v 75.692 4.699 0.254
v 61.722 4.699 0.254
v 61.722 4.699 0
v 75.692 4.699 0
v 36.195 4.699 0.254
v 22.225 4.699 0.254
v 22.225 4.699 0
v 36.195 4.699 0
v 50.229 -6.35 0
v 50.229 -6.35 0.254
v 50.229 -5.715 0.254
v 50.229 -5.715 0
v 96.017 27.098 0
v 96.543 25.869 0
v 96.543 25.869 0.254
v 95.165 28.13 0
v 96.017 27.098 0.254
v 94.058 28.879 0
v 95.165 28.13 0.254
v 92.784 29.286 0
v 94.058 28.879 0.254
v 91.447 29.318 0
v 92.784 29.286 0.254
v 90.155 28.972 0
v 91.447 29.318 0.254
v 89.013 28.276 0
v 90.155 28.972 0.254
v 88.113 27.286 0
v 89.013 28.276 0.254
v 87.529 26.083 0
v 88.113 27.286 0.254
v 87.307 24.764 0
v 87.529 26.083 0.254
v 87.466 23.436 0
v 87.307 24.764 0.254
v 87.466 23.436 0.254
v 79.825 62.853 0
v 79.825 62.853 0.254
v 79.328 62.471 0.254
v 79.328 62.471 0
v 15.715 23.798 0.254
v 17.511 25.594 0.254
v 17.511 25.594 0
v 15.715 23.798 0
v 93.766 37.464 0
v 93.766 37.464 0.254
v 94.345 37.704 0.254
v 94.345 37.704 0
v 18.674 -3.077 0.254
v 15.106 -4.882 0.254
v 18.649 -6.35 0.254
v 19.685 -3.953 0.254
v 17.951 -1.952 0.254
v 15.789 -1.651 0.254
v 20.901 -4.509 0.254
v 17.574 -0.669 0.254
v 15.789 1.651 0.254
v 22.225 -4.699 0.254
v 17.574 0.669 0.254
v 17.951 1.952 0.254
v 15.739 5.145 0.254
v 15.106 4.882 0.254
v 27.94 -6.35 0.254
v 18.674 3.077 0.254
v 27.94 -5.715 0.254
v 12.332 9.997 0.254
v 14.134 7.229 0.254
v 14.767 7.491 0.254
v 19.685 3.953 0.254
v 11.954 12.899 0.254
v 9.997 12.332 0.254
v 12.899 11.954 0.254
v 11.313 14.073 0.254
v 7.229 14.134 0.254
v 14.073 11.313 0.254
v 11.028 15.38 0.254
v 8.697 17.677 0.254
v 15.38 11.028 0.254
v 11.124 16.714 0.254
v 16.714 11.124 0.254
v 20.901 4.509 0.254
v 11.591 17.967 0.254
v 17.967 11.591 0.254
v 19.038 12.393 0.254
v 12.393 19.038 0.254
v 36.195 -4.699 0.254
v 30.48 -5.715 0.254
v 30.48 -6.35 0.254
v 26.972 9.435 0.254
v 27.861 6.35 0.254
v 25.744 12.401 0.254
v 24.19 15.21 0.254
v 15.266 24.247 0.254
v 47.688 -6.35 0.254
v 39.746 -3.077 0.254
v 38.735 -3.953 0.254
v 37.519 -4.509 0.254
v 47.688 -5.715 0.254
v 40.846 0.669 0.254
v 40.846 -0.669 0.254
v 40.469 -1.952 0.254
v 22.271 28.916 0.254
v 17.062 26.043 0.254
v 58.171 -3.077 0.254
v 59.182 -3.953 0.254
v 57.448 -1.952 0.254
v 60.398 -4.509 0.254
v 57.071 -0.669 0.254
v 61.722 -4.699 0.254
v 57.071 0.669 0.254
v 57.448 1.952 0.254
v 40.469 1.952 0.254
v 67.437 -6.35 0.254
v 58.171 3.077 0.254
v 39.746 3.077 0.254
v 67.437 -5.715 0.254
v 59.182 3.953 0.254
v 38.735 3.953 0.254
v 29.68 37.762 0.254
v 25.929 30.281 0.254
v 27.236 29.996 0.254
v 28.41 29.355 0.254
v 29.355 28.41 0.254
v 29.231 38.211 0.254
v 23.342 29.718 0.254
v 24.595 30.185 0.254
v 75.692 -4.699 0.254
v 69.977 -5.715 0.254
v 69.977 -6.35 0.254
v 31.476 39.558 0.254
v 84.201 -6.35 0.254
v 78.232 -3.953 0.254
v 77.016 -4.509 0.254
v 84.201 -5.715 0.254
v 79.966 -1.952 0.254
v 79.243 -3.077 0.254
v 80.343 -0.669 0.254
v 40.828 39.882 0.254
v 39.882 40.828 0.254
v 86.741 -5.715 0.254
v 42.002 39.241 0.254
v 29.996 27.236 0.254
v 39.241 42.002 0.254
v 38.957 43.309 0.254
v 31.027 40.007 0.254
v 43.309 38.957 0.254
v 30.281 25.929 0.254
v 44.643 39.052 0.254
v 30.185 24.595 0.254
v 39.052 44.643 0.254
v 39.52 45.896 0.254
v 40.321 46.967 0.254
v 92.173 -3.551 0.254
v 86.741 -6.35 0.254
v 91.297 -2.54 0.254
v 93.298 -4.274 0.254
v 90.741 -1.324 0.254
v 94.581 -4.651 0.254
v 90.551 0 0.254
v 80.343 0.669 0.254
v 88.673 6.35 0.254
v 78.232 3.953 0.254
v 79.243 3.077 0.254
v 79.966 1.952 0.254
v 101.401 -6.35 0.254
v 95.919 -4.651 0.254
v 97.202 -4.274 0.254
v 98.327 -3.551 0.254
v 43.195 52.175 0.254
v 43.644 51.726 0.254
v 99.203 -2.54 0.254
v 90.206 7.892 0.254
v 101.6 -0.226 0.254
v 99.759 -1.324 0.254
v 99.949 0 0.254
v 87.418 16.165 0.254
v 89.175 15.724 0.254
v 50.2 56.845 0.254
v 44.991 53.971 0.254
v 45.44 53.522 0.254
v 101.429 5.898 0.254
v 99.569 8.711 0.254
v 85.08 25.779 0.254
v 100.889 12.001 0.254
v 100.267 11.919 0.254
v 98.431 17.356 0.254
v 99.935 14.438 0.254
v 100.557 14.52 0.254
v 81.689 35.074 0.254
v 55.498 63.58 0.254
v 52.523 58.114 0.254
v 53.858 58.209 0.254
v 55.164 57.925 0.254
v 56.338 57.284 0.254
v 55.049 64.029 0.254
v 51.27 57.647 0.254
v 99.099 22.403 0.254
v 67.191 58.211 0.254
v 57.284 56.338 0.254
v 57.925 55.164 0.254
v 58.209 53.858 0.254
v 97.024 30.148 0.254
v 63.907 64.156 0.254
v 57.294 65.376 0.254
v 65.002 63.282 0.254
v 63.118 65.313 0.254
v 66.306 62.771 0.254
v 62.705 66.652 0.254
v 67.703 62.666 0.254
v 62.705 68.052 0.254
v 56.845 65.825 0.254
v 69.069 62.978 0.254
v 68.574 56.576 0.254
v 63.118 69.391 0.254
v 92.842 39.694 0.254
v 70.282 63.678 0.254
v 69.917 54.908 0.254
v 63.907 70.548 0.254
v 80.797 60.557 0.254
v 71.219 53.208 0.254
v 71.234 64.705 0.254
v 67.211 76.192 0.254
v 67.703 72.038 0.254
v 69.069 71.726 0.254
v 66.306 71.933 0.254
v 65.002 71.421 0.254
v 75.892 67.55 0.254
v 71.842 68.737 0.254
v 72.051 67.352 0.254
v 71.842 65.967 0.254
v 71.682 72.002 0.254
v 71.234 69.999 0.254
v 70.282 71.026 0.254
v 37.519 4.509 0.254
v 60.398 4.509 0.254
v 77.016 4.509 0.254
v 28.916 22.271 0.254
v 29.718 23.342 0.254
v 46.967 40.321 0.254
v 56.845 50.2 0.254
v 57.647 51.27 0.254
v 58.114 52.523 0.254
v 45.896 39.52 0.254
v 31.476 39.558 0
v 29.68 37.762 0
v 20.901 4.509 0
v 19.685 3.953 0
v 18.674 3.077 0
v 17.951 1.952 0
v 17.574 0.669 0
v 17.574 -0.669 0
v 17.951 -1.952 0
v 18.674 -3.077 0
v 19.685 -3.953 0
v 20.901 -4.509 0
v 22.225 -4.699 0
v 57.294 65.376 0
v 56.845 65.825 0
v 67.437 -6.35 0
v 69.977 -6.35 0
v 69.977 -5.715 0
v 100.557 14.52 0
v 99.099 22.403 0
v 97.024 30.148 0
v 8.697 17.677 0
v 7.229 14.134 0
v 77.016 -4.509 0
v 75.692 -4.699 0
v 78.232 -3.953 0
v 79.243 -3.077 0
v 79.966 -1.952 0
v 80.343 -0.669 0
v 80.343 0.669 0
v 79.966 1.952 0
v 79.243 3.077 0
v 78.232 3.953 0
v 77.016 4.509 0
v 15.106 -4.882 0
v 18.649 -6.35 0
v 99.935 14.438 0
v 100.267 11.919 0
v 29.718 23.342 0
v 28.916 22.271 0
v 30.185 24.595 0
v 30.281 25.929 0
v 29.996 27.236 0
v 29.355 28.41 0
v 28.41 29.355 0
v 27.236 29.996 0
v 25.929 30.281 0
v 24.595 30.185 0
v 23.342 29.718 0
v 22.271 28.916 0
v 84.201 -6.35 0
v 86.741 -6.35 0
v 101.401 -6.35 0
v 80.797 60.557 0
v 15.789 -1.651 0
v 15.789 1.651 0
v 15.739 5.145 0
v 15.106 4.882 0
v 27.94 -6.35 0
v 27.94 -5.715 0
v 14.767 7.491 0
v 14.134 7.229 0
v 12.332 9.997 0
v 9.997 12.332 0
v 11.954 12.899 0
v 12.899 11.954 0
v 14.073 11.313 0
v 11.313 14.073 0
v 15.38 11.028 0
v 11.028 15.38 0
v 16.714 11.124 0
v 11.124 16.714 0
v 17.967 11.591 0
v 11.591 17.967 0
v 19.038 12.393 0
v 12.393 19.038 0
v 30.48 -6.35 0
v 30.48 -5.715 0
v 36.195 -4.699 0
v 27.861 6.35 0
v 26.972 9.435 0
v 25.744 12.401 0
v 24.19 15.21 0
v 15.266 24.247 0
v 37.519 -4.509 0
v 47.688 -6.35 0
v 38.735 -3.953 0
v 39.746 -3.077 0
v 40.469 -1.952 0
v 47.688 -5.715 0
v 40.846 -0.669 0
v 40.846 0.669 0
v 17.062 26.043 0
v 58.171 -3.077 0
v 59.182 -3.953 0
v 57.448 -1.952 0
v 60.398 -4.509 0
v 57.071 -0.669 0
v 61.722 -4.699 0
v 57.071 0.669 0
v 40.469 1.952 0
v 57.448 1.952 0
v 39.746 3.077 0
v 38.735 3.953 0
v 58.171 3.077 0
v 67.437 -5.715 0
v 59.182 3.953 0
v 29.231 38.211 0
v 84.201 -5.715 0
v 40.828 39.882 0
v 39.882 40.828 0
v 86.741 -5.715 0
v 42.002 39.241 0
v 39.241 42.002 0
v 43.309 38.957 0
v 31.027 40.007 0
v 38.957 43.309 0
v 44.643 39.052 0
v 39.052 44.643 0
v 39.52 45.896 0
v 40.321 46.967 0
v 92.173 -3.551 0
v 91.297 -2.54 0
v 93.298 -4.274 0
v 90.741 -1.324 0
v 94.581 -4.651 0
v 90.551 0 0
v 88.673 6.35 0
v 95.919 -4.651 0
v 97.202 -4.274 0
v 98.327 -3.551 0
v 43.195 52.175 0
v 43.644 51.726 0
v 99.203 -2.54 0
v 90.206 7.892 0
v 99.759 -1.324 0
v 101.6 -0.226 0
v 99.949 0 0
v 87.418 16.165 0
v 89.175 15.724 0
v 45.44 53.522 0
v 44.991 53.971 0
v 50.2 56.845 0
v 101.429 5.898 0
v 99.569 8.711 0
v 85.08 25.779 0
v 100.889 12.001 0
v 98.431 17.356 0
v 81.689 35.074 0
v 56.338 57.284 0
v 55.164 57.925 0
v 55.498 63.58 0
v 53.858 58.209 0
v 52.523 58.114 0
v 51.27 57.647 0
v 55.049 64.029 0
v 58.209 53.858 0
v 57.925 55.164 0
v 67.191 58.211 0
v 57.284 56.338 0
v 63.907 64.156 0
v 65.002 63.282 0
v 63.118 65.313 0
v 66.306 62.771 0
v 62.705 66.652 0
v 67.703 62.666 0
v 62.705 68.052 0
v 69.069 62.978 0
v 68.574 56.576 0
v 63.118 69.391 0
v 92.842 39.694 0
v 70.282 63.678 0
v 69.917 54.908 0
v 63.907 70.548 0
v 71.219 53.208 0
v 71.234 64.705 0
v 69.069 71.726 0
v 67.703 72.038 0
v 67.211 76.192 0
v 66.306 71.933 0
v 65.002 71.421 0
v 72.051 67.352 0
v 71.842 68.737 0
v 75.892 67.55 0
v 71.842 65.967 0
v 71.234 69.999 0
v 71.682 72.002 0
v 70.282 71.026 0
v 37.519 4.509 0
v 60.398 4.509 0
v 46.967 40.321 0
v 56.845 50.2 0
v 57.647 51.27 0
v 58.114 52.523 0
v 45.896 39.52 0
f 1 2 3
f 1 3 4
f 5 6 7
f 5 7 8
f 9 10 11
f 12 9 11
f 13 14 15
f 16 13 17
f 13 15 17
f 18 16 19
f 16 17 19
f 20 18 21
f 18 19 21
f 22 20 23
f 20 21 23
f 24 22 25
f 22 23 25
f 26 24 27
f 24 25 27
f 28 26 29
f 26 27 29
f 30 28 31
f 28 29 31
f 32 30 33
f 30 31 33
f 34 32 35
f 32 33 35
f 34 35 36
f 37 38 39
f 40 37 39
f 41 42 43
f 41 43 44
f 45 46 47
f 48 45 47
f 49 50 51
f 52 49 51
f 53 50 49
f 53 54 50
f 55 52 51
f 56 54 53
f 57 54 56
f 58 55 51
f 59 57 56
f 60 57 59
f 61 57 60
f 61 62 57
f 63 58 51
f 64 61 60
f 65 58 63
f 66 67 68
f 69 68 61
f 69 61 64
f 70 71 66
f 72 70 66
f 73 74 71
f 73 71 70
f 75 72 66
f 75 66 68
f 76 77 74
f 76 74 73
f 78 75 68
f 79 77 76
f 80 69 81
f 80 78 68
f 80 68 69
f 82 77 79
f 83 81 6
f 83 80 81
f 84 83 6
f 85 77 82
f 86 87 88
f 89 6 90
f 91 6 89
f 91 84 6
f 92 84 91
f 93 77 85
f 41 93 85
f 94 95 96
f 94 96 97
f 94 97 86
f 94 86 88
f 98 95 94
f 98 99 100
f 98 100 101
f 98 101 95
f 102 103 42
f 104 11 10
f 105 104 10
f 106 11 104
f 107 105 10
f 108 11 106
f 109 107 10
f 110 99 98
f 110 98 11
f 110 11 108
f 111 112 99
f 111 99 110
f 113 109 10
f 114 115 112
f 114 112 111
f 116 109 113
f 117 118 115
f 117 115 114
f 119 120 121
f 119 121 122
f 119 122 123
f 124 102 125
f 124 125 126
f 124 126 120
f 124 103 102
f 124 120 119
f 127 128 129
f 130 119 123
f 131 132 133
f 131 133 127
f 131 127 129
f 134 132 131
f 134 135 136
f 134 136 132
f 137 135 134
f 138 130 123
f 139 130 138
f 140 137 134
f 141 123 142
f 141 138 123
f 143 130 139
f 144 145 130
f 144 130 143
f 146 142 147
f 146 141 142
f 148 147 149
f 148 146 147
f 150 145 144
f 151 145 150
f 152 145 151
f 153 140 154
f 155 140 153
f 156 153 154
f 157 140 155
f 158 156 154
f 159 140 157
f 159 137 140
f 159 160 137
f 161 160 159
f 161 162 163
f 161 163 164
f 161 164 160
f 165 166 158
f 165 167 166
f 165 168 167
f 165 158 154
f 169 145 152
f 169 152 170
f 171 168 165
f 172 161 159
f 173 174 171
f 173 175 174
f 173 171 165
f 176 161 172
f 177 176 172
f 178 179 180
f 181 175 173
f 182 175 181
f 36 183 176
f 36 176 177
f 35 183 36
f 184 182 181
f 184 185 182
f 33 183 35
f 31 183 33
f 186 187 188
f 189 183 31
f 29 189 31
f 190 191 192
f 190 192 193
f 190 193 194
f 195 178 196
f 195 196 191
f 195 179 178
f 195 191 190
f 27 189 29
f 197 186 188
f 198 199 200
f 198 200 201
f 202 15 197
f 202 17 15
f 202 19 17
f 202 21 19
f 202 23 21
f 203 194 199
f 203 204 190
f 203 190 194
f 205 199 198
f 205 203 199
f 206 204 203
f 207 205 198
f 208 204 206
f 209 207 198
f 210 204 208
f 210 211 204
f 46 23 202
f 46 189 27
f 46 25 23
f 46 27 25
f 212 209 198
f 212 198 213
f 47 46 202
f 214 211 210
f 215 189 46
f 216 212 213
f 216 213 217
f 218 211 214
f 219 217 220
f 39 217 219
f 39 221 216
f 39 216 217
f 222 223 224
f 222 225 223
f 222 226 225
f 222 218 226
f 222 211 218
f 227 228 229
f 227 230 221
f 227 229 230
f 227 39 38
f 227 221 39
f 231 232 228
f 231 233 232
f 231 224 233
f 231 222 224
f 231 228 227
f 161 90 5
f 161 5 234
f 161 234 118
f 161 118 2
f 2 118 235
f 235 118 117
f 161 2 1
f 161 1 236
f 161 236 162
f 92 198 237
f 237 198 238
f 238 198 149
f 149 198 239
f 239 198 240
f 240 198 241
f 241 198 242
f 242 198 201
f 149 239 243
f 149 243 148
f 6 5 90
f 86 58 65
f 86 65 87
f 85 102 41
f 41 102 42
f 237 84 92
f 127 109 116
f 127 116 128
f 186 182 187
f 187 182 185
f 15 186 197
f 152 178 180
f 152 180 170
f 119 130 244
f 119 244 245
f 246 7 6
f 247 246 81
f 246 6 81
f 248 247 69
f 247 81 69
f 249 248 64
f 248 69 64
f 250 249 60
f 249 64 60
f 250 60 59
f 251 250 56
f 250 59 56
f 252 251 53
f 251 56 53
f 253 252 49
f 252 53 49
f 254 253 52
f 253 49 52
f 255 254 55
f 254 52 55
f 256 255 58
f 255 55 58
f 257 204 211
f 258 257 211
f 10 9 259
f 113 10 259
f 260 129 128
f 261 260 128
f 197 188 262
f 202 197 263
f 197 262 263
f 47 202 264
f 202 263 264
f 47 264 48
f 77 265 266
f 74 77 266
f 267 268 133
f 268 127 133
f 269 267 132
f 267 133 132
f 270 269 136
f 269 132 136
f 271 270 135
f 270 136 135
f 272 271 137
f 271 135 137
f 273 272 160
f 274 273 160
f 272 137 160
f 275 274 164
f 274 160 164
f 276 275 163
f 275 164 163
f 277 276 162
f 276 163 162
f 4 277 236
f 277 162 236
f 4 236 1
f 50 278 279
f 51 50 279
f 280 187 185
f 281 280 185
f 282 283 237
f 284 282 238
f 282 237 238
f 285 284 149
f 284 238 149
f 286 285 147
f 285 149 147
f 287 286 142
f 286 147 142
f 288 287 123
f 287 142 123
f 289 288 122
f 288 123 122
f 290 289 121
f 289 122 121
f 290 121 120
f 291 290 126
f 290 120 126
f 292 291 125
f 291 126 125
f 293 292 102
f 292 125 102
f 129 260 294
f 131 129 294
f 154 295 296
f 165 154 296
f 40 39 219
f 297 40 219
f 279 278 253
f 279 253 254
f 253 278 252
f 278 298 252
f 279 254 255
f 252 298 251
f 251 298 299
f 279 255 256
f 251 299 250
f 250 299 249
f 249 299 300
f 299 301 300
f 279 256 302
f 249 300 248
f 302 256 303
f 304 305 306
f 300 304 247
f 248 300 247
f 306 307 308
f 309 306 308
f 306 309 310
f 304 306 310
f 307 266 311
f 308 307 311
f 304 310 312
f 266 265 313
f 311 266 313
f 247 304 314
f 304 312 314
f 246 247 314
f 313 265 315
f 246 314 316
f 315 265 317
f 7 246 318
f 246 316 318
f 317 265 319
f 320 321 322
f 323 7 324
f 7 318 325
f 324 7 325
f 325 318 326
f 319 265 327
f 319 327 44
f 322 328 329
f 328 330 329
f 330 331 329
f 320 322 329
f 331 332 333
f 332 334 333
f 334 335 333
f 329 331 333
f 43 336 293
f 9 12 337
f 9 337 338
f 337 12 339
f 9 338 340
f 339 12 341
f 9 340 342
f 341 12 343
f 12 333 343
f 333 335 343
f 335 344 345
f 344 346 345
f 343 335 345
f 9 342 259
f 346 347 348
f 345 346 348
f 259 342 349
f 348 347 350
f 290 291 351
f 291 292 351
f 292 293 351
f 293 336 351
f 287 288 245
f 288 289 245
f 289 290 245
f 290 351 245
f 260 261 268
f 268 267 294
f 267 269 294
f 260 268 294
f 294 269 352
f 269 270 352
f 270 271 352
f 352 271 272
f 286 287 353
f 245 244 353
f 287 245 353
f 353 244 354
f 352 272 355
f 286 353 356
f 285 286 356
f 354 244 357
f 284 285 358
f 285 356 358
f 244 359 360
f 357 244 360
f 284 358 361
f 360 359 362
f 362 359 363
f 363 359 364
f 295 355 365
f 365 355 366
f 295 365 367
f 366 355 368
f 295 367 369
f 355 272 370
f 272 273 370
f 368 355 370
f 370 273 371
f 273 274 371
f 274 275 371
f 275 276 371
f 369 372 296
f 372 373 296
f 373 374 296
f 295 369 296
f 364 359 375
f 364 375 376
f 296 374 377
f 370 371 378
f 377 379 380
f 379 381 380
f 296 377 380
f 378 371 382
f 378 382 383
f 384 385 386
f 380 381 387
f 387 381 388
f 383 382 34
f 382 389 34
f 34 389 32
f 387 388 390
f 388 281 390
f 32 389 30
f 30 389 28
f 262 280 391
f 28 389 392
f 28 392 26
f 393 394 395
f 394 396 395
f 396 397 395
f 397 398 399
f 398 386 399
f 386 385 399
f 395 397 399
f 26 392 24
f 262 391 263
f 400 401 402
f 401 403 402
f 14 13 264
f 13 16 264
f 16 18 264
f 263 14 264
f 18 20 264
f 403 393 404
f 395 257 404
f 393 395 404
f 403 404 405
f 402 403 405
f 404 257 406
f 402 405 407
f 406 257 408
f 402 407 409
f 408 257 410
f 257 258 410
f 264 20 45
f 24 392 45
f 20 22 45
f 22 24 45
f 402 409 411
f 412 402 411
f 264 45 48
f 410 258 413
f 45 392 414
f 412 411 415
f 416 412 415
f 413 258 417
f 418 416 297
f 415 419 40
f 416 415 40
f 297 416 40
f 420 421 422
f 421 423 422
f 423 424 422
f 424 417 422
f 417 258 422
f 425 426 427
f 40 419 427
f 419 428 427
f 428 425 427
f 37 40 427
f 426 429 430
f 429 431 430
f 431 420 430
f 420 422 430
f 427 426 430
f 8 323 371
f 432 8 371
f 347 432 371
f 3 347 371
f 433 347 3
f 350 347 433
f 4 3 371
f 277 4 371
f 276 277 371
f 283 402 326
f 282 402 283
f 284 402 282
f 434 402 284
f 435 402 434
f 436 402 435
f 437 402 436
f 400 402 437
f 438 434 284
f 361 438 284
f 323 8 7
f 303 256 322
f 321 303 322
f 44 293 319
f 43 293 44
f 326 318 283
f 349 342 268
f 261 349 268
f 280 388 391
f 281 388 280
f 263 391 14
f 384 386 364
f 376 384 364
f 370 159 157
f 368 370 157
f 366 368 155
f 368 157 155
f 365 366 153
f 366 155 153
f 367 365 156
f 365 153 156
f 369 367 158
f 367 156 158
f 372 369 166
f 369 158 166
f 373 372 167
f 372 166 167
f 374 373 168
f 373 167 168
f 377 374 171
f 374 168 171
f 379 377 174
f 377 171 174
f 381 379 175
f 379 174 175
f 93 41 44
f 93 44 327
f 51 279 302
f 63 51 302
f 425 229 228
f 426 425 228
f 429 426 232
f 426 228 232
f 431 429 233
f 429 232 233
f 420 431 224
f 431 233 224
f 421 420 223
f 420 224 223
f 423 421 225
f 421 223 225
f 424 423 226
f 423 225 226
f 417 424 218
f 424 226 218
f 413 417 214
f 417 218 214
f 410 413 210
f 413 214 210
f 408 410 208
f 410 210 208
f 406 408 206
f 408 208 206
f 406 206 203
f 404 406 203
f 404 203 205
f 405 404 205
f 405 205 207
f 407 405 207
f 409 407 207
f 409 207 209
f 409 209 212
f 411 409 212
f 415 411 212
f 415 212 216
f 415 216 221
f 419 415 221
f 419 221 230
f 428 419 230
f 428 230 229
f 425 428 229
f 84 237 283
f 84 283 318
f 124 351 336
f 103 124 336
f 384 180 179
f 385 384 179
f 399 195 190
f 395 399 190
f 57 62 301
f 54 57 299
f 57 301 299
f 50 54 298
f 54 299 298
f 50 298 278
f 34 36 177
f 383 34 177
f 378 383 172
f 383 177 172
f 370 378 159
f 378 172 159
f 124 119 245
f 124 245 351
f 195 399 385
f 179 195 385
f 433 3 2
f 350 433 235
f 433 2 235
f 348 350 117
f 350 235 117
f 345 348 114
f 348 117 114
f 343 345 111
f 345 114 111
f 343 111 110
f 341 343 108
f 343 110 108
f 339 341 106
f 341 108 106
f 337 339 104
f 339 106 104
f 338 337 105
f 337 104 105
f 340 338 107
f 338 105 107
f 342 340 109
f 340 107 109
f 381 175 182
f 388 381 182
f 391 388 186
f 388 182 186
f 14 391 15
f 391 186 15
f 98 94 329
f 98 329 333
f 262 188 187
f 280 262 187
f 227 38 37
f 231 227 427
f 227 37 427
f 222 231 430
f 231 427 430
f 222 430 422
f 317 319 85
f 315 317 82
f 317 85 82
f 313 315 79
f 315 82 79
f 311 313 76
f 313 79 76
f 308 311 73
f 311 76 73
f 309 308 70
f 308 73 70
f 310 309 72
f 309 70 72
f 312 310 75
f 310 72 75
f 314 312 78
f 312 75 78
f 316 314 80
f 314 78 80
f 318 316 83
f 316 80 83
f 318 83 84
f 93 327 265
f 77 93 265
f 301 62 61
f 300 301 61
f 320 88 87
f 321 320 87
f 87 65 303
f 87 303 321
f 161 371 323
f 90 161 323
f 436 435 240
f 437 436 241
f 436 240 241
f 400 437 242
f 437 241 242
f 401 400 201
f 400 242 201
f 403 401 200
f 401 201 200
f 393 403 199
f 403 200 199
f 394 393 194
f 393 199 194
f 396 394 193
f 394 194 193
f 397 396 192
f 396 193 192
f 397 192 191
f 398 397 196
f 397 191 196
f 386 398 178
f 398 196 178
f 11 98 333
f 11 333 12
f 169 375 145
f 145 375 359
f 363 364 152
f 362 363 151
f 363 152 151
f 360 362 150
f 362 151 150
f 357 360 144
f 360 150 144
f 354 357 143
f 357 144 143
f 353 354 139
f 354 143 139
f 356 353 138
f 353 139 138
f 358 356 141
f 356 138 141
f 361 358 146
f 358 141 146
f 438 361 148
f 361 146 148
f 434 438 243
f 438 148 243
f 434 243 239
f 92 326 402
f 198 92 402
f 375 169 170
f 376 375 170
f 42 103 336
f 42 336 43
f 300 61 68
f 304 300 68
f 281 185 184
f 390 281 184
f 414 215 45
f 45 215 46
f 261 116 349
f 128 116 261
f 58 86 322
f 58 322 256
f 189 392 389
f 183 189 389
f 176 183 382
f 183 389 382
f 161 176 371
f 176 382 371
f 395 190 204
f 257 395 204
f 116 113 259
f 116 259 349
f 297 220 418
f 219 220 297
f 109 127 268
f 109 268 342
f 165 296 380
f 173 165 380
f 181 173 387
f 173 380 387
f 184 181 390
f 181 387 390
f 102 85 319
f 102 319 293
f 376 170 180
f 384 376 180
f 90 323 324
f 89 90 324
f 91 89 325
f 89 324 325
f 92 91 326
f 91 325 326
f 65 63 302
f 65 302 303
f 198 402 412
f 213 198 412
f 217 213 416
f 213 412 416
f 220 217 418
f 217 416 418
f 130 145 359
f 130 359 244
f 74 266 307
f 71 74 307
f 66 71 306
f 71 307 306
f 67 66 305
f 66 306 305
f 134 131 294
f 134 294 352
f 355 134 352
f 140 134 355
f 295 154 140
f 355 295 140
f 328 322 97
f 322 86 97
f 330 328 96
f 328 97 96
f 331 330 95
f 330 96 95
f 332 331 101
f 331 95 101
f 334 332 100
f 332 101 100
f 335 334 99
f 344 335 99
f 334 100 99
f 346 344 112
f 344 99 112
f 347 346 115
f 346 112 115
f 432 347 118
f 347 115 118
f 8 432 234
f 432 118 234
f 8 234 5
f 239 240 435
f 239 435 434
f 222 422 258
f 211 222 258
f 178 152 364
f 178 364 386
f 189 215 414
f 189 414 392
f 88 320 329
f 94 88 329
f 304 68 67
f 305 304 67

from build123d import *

# Parameters (mm, degrees)
BOSS_EXTRUDE1_DEPTH = 0.254
SKETCH2_R           = 4.699
CUT_EXTRUDE1_DEPTH  = 1.254
SKETCH3_W           = 2.54
SKETCH3_H           = 0.635
CUT_EXTRUDE2_DEPTH  = 1.254
CUT_EXTRUDE4_DEPTH  = 1.254
CUT_EXTRUDE5_DEPTH  = 1.254


with BuildPart() as part:
    # Sketch1 → Boss-Extrude1 (new body)
    with BuildSketch(Plane.XY):
        with BuildLine():
            Line((67.21146711, 76.191723231), (8.696654013, 17.676910134))
            Line((8.696654013, 17.676910134), (7.228954972, 14.133571205))
            ThreePointArc((7.228954972, 14.133571205), (14.666587579, 6.075099489), (15.105587123, -4.88230096))
            Line((15.105587123, -4.88230096), (18.648926052, -6.35))
            Line((18.648926052, -6.35), (101.401368334, -6.35))
            ThreePointArc((101.401368334, -6.35), (93.866160503, 38.880636728), (67.21146711, 76.191723231))
        make_face()
        with BuildLine():
            Line((88.672924278, 6.35), (27.86051193, 6.35))
            ThreePointArc((27.86051193, 6.35), (26.399857642, 10.93517908), (24.190484974, 15.210228852))
            Line((24.190484974, 15.210228852), (67.191354125, 58.211098004))
            ThreePointArc((67.191354125, 58.211098004), (82.13289044, 34.020557137), (88.672924278, 6.35))
        make_face(mode=Mode.SUBTRACT)
    extrude(amount=BOSS_EXTRUDE1_DEPTH)

    # Sketch2 → Cut-Extrude1 (cut, through all)
    with BuildSketch(Plane.XY.offset(0.254)):
        with Locations((22.225, 0)):
            Circle(SKETCH2_R)
        with Locations((36.195, 0)):
            Circle(SKETCH2_R)
        with Locations((61.722, 0)):
            Circle(SKETCH2_R)
        with Locations((75.692, 0)):
            Circle(SKETCH2_R)
        with Locations((95.25, 0)):
            Circle(SKETCH2_R)
        with Locations((15.715448212, 15.715448212)):
            Circle(SKETCH2_R)
        with Locations((25.593729945, 25.593729945)):
            Circle(SKETCH2_R)
        with Locations((43.644044748, 43.644044748)):
            Circle(SKETCH2_R)
        with Locations((53.522326482, 53.522326482)):
            Circle(SKETCH2_R)
        with Locations((92.004434954, 24.652514046)):
            Circle(SKETCH2_R)
        with Locations((82.48891971, 47.625)):
            Circle(SKETCH2_R)
        with Locations((67.351920908, 67.351920908)):
            Circle(SKETCH2_R)
    extrude(amount=-CUT_EXTRUDE1_DEPTH, mode=Mode.SUBTRACT)

    # Sketch3 → Cut-Extrude2 (cut, through all)
    with BuildSketch(Plane.XY.offset(0.254)):
        Polygon((15.266435406, 24.246691527), (17.06248663, 26.042742751), (17.511499436, 25.593729945), (15.715448212, 23.797678721), align=None)
        Polygon((44.991083167, 53.971339288), (43.195031942, 52.175288063), (43.644044748, 51.726275257), (45.440095973, 53.522326482), align=None)
        with Locations((29.21, -6.0325)):
            Rectangle(SKETCH3_W, SKETCH3_H)
        with Locations((68.707, -6.0325)):
            Rectangle(SKETCH3_W, SKETCH3_H)
        Polygon((29.230733674, 38.210989795), (31.026784898, 40.007041019), (31.475797704, 39.558028213), (29.67974648, 37.761976989), align=None)
        Polygon((56.845021246, 65.825277367), (55.048970022, 64.029226143), (55.497982828, 63.580213337), (57.294034052, 65.376264561), align=None)
        with Locations((48.9585, -6.0325)):
            Rectangle(SKETCH3_W, SKETCH3_H)
        with Locations((85.471, -6.0325)):
            Rectangle(SKETCH3_W, SKETCH3_H)
        Polygon((99.935462164, 14.437711971), (100.266998693, 11.919442024), (101.526133667, 12.085210288), (101.194597138, 14.603480236), align=None)
        Polygon((93.765504959, 37.464305742), (94.938831965, 37.950313702), (93.966816047, 40.296967714), (92.793489041, 39.810959755), align=None)
        Polygon((79.327792988, 62.471156422), (80.874047017, 60.456038938), (81.88160576, 61.229165953), (80.33535173, 63.244283437), align=None)
        Polygon((13.593916116, 7.005422516), (14.565932035, 4.658768503), (15.739259041, 5.144776462), (14.767243123, 7.491430475), align=None)
    extrude(amount=-CUT_EXTRUDE2_DEPTH, mode=Mode.SUBTRACT)

    # Sketch6 → Cut-Extrude4 (cut, through all)
    with BuildSketch(Plane.XY.offset(0.254)):
        with BuildLine():
            Line((12.392753447, 19.038142977), (22.27103518, 28.91642471))
            ThreePointArc((22.27103518, 28.91642471), (28.91642471, 28.91642471), (28.91642471, 22.27103518))
            Line((28.91642471, 22.27103518), (19.038142977, 12.392753447))
            ThreePointArc((19.038142977, 12.392753447), (12.392753447, 12.392753447), (12.392753447, 19.038142977))
        make_face()
        with BuildLine():
            Line((40.321349984, 46.966739513), (50.199631717, 56.845021246))
            ThreePointArc((50.199631717, 56.845021246), (56.845021246, 56.845021246), (56.845021246, 50.199631717))
            Line((56.845021246, 50.199631717), (46.966739513, 40.321349984))
            ThreePointArc((46.966739513, 40.321349984), (40.321349984, 40.321349984), (40.321349984, 46.966739513))
        make_face()
        with BuildLine():
            Line((22.225, 4.699), (36.195, 4.699))
            ThreePointArc((36.195, 4.699), (40.894, 0), (36.195, -4.699))
            Line((36.195, -4.699), (22.225, -4.699))
            ThreePointArc((22.225, -4.699), (17.526, 0), (22.225, 4.699))
        make_face()
        with BuildLine():
            Line((61.722, 4.699), (75.692, 4.699))
            ThreePointArc((75.692, 4.699), (80.391, 0), (75.692, -4.699))
            Line((75.692, -4.699), (61.722, -4.699))
            ThreePointArc((61.722, -4.699), (57.023, 0), (61.722, 4.699))
        make_face()
        with BuildLine():
            ThreePointArc((99.949, 0), (99.093922449, 13.045962386), (96.543320412, 25.868704739))
            ThreePointArc((96.543320412, 25.868704739), (90.788244261, 29.191399504), (87.465549496, 23.436323353))
            ThreePointArc((87.465549496, 23.436323353), (89.776323642, 11.819277232), (90.551, 0))
            ThreePointArc((90.551, 0), (95.25, -4.699), (99.949, 0))
        make_face()
    extrude(amount=-CUT_EXTRUDE4_DEPTH, mode=Mode.SUBTRACT)

    # Sketch5 → Cut-Extrude5 (cut, through all)
    with BuildSketch(Plane.XY.offset(0.254)):
        with BuildLine():
            Line((70.21145334, 52.434423044), (82.30303448, 61.71261958))
            ThreePointArc((82.30303448, 61.71261958), (89.088033287, 51.435), (94.59621353, 40.420208878))
            Line((94.59621353, 40.420208878), (80.515269058, 34.587690707))
            ThreePointArc((80.515269058, 34.587690707), (75.889806134, 43.815), (70.21145334, 52.434423044))
        make_face()
    extrude(amount=-CUT_EXTRUDE5_DEPTH, mode=Mode.SUBTRACT)


solid = part.part
